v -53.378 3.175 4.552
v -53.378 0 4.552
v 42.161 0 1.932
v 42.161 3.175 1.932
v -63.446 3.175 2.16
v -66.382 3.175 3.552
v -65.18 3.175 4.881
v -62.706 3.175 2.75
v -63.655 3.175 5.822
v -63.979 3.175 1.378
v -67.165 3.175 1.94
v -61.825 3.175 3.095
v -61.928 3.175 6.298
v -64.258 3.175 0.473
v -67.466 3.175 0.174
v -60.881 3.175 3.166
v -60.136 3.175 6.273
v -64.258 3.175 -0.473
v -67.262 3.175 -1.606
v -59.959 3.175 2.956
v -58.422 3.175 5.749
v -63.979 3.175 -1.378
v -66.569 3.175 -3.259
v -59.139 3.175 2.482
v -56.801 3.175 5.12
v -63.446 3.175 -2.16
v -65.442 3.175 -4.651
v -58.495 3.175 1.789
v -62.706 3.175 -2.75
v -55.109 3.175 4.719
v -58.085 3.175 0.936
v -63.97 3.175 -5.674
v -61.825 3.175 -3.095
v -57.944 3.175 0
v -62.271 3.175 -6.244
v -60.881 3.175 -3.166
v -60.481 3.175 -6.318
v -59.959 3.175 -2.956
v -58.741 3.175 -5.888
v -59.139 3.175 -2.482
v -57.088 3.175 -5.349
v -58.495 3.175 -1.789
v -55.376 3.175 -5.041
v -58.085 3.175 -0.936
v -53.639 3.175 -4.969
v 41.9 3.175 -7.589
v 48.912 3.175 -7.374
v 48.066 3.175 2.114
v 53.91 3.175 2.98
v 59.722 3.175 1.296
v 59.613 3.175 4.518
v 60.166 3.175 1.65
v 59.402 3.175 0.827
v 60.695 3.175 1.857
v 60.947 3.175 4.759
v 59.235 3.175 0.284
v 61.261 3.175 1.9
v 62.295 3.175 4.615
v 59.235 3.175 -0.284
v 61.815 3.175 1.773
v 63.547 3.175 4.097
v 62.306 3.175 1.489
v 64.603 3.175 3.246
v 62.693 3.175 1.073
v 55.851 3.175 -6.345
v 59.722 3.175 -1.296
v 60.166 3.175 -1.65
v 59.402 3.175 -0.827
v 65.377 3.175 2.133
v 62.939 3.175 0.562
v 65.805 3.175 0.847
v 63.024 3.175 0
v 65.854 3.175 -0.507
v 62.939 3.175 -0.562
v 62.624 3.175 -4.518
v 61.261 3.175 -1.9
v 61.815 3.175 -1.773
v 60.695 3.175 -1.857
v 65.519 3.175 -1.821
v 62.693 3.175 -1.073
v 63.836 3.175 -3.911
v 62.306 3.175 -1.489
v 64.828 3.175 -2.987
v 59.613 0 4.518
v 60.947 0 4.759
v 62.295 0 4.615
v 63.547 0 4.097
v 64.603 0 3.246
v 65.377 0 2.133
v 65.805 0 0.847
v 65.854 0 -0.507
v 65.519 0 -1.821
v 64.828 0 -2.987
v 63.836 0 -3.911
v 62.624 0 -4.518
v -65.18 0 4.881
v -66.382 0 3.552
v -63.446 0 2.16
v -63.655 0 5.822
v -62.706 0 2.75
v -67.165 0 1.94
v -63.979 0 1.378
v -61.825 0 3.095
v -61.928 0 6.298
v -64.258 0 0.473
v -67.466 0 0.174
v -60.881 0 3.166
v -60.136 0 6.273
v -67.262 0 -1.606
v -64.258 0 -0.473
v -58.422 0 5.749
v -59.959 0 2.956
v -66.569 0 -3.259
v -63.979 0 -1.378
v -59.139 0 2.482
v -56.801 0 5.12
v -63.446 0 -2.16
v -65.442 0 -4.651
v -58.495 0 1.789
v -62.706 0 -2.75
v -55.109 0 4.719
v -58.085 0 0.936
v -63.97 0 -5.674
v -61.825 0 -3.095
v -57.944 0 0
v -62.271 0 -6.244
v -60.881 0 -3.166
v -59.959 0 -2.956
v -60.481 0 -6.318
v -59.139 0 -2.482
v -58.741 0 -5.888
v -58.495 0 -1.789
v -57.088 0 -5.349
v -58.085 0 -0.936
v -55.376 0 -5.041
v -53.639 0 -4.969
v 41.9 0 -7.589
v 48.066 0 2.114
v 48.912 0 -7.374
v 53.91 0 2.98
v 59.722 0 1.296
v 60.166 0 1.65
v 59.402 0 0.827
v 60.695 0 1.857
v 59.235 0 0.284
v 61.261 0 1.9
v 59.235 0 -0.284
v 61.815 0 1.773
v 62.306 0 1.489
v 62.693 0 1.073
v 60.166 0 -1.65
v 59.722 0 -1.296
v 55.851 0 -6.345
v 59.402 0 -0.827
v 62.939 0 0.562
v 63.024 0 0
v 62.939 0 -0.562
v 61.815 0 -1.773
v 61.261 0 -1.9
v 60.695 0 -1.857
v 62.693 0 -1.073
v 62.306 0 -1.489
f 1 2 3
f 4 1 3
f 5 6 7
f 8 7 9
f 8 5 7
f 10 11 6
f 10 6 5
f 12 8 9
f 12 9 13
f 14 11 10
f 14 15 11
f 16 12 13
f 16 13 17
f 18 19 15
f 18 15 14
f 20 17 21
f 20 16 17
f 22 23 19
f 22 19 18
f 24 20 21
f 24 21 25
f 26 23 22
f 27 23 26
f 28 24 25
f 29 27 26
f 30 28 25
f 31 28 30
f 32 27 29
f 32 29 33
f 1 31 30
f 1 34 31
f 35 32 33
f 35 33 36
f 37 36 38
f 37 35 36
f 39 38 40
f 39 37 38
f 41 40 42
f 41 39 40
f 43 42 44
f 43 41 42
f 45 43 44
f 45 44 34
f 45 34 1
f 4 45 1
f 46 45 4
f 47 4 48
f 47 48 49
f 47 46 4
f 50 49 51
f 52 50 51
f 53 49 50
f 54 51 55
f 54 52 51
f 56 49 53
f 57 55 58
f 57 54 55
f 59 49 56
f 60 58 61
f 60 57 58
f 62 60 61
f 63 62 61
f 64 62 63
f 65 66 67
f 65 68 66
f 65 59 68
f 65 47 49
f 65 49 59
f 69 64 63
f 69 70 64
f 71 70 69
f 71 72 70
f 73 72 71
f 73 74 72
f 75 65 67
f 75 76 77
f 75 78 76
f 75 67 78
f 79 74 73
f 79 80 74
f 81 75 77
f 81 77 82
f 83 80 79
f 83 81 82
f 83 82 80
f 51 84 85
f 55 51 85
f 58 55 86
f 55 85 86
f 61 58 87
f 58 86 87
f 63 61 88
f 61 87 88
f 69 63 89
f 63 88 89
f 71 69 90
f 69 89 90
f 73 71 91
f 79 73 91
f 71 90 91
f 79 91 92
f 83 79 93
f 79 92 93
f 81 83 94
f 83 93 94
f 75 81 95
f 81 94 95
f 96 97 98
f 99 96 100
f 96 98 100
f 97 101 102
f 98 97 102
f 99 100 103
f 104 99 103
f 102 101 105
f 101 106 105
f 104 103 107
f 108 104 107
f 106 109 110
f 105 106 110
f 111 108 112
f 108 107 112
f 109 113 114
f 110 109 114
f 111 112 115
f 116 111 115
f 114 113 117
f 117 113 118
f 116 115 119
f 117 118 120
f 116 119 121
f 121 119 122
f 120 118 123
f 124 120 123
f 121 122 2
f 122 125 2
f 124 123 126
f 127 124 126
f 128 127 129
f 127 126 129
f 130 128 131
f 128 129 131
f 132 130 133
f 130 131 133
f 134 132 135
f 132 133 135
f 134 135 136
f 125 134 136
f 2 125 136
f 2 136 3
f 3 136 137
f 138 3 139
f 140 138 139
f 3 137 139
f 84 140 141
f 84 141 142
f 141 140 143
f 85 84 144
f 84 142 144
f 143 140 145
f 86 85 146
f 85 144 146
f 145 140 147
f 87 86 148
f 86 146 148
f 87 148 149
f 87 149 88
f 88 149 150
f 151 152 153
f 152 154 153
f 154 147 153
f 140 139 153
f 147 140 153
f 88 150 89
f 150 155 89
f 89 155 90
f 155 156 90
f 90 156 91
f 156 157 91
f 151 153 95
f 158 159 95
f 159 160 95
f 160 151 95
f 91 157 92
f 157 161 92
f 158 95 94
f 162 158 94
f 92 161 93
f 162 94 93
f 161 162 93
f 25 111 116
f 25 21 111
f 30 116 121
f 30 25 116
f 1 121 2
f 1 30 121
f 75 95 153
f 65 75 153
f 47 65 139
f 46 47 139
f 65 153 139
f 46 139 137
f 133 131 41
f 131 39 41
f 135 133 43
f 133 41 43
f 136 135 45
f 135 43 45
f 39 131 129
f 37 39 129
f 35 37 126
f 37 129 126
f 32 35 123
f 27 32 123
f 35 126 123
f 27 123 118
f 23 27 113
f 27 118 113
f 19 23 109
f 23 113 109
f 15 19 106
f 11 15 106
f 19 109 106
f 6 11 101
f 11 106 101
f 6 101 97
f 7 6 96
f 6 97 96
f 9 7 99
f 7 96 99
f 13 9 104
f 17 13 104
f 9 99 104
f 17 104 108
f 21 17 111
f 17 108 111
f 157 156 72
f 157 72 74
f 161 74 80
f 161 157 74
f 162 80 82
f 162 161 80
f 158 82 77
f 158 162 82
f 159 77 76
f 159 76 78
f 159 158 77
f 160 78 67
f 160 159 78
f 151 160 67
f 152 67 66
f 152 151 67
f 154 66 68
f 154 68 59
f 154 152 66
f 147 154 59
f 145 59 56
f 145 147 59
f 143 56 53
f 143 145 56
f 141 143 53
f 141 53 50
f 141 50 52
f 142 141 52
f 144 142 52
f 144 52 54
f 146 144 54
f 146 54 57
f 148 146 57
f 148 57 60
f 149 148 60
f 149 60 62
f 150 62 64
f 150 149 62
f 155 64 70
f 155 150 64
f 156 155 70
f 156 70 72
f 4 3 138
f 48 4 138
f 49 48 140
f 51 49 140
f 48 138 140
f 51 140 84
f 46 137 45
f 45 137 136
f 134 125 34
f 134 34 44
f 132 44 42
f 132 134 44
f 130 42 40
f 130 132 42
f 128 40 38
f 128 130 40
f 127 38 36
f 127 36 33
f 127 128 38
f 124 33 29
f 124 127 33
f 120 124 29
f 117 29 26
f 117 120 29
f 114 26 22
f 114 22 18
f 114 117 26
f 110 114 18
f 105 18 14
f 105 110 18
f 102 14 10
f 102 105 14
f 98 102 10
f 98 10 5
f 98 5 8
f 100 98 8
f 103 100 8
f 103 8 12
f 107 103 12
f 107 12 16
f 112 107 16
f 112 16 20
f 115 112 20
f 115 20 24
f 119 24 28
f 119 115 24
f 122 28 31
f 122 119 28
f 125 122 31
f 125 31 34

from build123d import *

# Parameters (mm, degrees)
SKETCH1_R           = 3.175
SKETCH1_R_2         = 1.905
BOSS_EXTRUDE1_DEPTH = 3.175
FILLET1_R           = 12.7


with BuildPart() as part:
    # Sketch1 → Boss-Extrude1 (new body)
    with BuildSketch(Plane(origin=(0, 0, 0), x_dir=(1, 0, 0), z_dir=(0, 1, 0))):
        with BuildLine():
            ThreePointArc((-57.050749937, 4.875846131), (-67.466363723, -0.174069026), (-56.789646398, -4.645574453))
            Line((-56.789646398, -4.645574453), (42.161094502, -1.93207299))
            ThreePointArc((42.161094502, -1.93207299), (51.000262943, -2.46173496), (59.613169718, -4.518255666))
            ThreePointArc((59.613169718, -4.518255666), (65.637005666, -1.505580282), (62.624330282, 4.518255666))
            ThreePointArc((62.624330282, 4.518255666), (52.396503486, 6.960374005), (41.899990962, 7.589347594))
            Line((41.899990962, 7.589347594), (-57.050749937, 4.875846131))
        make_face()
        with Locations((-61.11875, 0)):
            Circle(SKETCH1_R, mode=Mode.SUBTRACT)
        with Locations((61.11875, 0)):
            Circle(SKETCH1_R_2, mode=Mode.SUBTRACT)
    extrude(amount=BOSS_EXTRUDE1_DEPTH)

    # Fillet1
    fillet1_edges = [part.edges().sort_by_distance(p)[0] for p in [
        (-56.789646398, 1.5875, 4.645574453),
        (-57.050749937, 1.5875, -4.875846131),
    ]]
    fillet(fillet1_edges, radius=FILLET1_R)


solid = part.part
